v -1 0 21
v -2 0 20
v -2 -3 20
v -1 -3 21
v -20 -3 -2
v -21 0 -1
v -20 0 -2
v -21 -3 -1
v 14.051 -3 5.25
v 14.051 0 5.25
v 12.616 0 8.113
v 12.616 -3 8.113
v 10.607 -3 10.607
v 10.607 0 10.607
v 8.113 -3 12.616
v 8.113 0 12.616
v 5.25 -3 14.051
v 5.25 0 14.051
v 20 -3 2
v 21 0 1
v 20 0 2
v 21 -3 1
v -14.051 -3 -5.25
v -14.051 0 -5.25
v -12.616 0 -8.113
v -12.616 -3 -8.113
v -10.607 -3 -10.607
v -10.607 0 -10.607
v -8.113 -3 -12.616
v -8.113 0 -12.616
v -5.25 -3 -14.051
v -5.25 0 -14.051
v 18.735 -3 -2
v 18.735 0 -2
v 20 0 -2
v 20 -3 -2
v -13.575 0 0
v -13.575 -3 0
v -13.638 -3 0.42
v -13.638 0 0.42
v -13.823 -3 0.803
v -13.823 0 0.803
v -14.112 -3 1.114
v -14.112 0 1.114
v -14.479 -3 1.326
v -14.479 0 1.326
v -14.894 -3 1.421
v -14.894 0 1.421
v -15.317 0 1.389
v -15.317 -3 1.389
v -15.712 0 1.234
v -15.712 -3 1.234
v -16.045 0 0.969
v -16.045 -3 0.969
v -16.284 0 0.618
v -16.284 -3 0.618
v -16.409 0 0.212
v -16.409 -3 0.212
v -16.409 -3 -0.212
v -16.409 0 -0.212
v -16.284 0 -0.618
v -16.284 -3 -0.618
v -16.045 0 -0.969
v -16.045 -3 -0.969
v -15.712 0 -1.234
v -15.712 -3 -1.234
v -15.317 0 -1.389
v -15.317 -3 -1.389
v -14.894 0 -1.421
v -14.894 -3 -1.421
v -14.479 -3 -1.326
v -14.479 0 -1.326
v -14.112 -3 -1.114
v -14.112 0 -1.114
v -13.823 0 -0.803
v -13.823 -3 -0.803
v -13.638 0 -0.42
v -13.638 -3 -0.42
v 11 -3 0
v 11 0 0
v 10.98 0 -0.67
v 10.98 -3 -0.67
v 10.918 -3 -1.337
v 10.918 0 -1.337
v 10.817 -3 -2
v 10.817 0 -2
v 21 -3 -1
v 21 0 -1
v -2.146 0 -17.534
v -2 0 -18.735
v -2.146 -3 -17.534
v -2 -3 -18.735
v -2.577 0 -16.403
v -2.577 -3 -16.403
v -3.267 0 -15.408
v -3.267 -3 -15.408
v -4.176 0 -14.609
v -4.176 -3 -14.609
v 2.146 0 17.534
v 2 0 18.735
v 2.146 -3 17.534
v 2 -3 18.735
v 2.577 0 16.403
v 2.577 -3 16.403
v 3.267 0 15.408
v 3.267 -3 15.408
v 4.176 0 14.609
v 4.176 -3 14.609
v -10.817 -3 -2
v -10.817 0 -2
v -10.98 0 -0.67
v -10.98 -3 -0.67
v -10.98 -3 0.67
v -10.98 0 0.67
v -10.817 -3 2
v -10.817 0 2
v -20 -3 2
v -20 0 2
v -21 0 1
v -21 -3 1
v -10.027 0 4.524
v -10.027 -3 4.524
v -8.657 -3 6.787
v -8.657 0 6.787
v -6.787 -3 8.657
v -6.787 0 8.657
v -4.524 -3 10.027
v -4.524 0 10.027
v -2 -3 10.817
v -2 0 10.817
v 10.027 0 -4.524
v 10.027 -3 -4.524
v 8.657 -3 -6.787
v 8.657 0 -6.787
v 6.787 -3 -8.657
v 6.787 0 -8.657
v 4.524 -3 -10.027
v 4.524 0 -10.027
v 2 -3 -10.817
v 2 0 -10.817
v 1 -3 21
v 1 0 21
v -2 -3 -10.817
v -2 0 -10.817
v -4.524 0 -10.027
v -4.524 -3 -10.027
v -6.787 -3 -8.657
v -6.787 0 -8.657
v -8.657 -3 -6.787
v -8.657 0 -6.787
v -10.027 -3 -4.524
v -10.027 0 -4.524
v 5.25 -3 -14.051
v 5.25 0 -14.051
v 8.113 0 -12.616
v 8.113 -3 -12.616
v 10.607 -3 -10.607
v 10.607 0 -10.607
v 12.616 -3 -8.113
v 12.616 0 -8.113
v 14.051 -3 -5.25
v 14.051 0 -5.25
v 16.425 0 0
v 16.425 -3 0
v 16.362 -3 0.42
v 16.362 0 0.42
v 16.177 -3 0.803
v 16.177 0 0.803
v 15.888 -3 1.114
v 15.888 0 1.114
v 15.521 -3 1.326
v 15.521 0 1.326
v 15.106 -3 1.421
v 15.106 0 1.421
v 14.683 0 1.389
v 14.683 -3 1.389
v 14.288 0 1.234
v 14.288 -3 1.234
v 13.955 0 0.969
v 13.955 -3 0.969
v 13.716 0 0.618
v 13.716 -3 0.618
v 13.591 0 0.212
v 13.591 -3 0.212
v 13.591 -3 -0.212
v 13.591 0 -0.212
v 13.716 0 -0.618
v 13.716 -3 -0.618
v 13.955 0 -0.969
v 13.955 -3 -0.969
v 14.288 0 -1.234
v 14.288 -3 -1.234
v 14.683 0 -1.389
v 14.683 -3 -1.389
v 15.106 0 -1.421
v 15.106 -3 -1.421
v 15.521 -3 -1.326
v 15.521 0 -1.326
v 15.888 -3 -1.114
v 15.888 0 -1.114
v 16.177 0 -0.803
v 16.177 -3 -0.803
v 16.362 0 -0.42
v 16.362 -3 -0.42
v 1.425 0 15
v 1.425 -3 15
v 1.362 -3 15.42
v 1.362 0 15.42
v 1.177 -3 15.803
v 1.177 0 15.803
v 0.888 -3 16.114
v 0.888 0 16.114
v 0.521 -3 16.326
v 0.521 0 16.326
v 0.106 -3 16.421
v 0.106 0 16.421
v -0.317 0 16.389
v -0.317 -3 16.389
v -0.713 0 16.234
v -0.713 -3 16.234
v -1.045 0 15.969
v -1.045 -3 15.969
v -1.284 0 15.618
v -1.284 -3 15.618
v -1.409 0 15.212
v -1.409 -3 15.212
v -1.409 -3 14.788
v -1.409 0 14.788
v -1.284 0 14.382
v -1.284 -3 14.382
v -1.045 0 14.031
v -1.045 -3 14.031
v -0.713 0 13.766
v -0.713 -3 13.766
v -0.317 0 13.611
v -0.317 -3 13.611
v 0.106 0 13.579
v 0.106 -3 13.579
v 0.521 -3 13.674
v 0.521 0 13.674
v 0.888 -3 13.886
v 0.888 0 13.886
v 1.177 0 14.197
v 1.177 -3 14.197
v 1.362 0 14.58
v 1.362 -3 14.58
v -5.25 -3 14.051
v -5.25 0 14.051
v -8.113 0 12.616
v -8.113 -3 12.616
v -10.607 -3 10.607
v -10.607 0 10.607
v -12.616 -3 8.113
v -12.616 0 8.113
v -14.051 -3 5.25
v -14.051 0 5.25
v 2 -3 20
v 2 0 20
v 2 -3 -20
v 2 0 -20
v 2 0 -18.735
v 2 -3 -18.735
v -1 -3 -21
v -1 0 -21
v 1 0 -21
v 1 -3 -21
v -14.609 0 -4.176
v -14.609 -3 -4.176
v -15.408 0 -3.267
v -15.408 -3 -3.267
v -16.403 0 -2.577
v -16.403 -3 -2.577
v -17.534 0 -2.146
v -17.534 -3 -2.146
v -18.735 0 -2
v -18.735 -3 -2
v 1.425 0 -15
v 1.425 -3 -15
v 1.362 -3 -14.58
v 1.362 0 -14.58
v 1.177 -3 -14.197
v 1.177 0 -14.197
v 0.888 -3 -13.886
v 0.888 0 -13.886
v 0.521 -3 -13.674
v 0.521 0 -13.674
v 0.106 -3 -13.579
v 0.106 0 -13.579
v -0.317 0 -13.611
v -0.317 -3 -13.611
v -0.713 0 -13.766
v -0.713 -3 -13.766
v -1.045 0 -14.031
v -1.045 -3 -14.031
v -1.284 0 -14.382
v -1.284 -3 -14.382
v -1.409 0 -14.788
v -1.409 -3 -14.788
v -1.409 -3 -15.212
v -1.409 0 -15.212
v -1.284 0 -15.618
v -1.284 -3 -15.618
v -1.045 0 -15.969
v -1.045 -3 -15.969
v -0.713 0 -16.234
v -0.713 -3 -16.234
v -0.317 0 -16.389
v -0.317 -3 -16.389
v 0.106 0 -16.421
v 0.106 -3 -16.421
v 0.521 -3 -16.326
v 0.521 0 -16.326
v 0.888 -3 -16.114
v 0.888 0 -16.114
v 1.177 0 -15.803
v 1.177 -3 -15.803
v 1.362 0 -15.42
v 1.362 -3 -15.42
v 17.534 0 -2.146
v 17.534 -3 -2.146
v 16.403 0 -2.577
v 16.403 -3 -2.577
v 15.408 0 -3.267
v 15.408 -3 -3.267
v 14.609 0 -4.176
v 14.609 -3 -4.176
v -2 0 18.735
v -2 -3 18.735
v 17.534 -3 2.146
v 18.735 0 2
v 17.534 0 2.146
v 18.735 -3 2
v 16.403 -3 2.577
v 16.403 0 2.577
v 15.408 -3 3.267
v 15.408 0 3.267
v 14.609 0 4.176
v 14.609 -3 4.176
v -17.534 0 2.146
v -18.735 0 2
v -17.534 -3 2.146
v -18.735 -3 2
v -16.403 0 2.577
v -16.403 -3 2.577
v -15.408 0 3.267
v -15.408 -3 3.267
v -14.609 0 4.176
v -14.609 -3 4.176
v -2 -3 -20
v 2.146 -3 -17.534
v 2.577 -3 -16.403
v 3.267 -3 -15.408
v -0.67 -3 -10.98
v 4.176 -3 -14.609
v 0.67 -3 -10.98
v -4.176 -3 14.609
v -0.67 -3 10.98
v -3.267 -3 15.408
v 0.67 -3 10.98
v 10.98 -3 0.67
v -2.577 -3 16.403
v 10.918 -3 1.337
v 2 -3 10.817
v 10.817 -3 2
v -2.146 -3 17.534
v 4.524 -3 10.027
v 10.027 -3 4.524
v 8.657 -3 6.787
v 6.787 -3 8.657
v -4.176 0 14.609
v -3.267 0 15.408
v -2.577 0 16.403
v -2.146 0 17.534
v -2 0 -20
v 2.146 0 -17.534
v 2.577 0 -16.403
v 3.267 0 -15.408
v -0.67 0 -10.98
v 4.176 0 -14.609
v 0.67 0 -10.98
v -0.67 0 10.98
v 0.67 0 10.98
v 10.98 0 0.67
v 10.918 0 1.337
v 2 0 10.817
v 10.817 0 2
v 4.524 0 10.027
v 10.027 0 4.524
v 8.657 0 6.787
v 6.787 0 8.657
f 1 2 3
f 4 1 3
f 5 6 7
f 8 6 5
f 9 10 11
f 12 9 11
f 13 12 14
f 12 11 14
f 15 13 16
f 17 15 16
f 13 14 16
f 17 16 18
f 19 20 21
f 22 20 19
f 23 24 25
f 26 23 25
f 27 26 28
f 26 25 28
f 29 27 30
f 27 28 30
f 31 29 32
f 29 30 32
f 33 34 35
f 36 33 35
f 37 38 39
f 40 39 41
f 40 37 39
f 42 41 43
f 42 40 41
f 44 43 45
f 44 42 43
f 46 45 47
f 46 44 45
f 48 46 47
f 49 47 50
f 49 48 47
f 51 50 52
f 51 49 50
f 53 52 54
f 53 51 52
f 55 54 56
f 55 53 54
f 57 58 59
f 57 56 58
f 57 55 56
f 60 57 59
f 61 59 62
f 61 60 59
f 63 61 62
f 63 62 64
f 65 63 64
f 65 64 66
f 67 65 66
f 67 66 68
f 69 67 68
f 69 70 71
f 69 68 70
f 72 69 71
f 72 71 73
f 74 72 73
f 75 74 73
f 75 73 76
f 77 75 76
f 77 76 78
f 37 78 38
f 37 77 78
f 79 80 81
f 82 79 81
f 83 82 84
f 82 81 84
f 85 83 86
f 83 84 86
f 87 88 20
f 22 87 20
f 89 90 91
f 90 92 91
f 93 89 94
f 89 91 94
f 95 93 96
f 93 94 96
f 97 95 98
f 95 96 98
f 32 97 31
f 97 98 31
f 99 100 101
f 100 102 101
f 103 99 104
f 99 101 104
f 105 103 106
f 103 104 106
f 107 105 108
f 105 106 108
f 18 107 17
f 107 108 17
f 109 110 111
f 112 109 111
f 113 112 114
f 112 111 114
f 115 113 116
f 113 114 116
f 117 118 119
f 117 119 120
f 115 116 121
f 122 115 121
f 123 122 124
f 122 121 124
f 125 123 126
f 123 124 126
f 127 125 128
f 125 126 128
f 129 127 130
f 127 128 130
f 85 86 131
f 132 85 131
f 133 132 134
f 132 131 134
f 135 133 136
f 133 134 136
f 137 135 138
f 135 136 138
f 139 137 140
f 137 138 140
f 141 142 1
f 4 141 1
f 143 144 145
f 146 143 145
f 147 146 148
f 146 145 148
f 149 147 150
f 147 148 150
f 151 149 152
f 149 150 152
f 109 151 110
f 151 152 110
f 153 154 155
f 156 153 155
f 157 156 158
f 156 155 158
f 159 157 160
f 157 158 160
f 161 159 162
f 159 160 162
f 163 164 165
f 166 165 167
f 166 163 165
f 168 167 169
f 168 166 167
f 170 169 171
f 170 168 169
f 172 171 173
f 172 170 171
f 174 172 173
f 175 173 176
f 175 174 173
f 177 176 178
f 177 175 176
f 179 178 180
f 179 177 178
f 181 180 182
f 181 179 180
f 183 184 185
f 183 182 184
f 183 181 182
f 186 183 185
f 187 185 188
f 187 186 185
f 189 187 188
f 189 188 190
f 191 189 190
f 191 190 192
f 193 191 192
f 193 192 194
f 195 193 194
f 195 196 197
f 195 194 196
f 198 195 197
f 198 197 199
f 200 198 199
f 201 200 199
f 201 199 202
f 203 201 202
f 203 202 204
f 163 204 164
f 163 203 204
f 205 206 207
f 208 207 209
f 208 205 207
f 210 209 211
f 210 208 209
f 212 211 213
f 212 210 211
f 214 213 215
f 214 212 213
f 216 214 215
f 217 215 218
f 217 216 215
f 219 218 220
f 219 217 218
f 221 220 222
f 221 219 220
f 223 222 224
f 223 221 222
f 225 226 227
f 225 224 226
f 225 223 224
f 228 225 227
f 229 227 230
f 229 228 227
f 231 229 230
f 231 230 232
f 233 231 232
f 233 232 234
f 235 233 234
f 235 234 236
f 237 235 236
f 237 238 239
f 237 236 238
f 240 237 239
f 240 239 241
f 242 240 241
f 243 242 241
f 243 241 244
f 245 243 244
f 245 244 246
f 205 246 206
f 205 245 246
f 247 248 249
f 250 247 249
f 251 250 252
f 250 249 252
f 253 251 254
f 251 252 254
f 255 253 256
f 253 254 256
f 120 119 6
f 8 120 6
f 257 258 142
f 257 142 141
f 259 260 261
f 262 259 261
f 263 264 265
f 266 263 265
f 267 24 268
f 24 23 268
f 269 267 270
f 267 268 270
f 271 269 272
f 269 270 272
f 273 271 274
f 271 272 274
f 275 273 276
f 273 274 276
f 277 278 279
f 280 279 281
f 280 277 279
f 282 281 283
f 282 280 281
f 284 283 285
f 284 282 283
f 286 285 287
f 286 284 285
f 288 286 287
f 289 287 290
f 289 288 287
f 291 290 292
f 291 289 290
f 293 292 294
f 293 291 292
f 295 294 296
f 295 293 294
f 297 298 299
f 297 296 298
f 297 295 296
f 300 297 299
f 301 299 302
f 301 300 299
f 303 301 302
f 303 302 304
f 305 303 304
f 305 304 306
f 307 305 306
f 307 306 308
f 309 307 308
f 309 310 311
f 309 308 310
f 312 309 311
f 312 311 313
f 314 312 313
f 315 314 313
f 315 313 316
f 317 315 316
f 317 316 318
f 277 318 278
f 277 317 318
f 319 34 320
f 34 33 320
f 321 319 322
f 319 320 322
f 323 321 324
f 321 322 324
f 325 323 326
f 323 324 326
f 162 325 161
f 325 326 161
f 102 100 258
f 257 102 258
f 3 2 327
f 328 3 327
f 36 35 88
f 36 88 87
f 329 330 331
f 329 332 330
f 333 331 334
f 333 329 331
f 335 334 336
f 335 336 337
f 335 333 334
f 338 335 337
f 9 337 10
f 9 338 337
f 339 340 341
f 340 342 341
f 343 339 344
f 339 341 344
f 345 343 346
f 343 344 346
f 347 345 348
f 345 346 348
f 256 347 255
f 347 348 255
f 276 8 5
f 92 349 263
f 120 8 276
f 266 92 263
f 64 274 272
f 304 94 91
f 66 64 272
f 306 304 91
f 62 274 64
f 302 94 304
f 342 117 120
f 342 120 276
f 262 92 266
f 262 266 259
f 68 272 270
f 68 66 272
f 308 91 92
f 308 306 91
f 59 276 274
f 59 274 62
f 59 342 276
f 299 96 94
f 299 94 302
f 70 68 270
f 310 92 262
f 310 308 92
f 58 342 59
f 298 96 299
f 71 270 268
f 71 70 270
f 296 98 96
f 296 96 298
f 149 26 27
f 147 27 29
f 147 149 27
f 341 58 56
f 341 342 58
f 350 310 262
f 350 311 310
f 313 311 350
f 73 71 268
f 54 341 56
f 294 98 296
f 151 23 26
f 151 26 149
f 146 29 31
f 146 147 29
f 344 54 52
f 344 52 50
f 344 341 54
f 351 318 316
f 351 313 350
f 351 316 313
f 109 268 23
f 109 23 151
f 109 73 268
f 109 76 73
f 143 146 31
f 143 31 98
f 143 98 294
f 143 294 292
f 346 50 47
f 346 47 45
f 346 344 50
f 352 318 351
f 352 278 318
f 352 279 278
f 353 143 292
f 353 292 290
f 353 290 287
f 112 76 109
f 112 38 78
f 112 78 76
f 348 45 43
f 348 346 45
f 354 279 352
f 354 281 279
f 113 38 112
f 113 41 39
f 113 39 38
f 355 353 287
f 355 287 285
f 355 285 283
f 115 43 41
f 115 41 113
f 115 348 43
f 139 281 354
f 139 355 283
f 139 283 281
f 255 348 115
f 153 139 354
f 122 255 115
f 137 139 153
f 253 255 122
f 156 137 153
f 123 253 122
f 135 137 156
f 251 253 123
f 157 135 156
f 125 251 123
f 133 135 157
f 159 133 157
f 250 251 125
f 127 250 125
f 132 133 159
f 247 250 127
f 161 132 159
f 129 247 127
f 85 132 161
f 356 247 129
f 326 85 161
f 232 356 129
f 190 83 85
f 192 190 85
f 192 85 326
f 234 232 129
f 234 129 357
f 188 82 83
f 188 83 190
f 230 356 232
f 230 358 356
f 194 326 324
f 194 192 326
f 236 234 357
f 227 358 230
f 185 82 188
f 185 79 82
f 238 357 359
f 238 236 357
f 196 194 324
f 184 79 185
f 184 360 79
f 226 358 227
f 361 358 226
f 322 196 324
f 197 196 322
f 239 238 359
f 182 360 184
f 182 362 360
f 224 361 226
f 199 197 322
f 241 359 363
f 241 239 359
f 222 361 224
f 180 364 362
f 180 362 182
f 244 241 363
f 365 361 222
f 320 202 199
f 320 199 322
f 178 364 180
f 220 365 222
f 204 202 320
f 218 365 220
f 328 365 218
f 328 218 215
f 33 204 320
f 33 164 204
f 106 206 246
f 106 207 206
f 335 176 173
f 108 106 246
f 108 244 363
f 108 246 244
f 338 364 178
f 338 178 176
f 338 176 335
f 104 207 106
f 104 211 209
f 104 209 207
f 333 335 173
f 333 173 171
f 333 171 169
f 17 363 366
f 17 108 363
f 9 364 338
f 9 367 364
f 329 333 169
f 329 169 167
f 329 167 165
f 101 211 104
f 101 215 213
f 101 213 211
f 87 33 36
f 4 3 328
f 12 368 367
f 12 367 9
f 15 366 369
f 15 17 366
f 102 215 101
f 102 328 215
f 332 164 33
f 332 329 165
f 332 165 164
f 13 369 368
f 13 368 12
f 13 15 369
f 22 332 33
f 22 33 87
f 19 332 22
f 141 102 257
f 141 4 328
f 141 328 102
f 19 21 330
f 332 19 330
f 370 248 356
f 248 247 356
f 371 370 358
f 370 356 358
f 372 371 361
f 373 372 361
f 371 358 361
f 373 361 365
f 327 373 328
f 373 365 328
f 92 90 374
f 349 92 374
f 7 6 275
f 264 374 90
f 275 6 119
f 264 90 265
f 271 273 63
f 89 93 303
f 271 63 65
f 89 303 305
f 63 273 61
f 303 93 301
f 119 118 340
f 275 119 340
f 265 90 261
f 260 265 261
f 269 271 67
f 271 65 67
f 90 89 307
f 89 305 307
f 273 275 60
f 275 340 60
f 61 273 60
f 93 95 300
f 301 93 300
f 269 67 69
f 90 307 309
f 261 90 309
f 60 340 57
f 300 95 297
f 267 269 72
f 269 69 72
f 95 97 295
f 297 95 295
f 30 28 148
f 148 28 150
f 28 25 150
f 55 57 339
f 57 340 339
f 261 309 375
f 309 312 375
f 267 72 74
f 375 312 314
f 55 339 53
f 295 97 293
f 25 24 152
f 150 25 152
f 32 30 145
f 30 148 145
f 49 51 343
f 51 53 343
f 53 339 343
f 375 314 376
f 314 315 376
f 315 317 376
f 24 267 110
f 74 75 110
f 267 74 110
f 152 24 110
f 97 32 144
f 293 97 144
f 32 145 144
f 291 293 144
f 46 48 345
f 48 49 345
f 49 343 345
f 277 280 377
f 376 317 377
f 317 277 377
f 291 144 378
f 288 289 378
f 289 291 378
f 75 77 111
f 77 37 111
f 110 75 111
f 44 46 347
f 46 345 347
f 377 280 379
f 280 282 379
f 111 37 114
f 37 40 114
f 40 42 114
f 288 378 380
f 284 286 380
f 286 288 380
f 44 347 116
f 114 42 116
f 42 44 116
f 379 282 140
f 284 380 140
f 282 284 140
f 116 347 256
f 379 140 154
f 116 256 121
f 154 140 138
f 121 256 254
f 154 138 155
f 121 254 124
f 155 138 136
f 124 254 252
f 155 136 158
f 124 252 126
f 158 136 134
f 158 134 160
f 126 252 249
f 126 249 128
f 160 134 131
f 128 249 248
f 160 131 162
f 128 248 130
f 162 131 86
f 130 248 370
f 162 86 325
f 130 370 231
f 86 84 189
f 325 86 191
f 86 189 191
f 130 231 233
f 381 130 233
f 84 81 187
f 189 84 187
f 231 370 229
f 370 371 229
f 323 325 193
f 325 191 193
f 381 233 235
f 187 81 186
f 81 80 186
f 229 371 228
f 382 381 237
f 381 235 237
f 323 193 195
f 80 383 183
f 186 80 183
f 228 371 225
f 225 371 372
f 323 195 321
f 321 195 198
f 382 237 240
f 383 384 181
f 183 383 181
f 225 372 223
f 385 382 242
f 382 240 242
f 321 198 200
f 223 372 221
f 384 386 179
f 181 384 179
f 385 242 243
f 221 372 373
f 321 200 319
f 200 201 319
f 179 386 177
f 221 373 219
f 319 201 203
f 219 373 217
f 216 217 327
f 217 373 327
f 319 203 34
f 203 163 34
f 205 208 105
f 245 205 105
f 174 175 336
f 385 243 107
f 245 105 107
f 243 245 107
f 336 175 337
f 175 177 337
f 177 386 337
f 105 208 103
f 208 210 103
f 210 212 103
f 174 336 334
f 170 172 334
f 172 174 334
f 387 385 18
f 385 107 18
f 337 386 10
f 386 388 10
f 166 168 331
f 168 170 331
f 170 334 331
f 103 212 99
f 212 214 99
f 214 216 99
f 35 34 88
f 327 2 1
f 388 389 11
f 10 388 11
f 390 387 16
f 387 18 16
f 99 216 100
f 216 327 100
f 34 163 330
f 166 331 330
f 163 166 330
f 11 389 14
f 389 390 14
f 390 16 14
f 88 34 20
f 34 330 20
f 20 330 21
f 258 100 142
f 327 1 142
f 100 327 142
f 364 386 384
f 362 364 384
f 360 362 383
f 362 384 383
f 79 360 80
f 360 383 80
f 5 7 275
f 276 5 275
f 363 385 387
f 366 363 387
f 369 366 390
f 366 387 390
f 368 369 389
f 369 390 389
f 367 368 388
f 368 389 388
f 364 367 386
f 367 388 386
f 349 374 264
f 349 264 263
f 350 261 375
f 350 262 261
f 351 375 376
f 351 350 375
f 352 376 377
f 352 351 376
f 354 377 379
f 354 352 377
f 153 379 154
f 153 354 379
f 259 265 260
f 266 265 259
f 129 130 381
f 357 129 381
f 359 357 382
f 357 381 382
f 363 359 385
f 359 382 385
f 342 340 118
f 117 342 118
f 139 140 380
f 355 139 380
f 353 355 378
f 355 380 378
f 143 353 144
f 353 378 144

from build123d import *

# Parameters (mm, degrees)
F1_DEPTH = 3
F2_SIZE  = 1
F3_SIZE  = 1
F4_SIZE  = 1
F5_SIZE  = 1
F6_SIZE  = 1
F7_R     = 1.425
F8_DEPTH = 3.001
F9_R     = 5
F10_R    = 5
F11_R    = 5
F12_R    = 5
F13_R    = 5
F14_R    = 5
F15_R    = 5
F16_R    = 5


with BuildPart() as f1:
    # F0 (on Front) → F1 (new body)
    with BuildSketch(Plane.XZ):
        with BuildLine():
            ThreePointArc((10.8166538264, 2), (10.9540675571, 1.004193186), (11, 0))
            ThreePointArc((11, 0), (10.9540675571, -1.004193186), (10.8166538264, -2))
            Line((10.8166538264, -2), (14.8660687473, -2))
            ThreePointArc((14.8660687473, -2), (14.9664797332, -1.0022396895), (15, 0))
            ThreePointArc((15, 0), (14.9664797332, 1.0022396895), (14.8660687473, 2))
            Line((14.8660687473, 2), (10.8166538264, 2))
        make_face()
        with BuildLine():
            ThreePointArc((2, 10.8166538264), (7.7781745931, 7.7781745931), (10.8166538264, 2))
            Line((10.8166538264, 2), (14.8660687473, 2))
            ThreePointArc((14.8660687473, 2), (10.6066017178, 10.6066017178), (2, 14.8660687473))
            Line((2, 14.8660687473), (2, 10.8166538264))
        make_face()
        with BuildLine():
            Line((14.8660687473, -2), (10.8166538264, -2))
            ThreePointArc((10.8166538264, -2), (7.7781745931, -7.7781745931), (2, -10.8166538264))
            Line((2, -10.8166538264), (2, -14.8660687473))
            ThreePointArc((2, -14.8660687473), (10.6066017178, -10.6066017178), (14.8660687473, -2))
        make_face()
        with BuildLine():
            ThreePointArc((-2, 10.8166538264), (0, 11), (2, 10.8166538264))
            Line((2, 10.8166538264), (2, 14.8660687473))
            ThreePointArc((2, 14.8660687473), (0, 15), (-2, 14.8660687473))
            Line((-2, 14.8660687473), (-2, 10.8166538264))
        make_face()
        with BuildLine():
            Line((21, 2), (14.8660687473, 2))
            ThreePointArc((14.8660687473, 2), (14.9664797332, 1.0022396895), (15, 0))
            ThreePointArc((15, 0), (14.9664797332, -1.0022396895), (14.8660687473, -2))
            Line((14.8660687473, -2), (21, -2))
            Line((21, -2), (21, 2))
        make_face()
        with BuildLine():
            Line((2, -14.8660687473), (2, -10.8166538264))
            ThreePointArc((2, -10.8166538264), (0, -11), (-2, -10.8166538264))
            Line((-2, -10.8166538264), (-2, -14.8660687473))
            ThreePointArc((-2, -14.8660687473), (0, -15), (2, -14.8660687473))
        make_face()
        with BuildLine():
            ThreePointArc((-10.8166538264, 2), (-7.7781745931, 7.7781745931), (-2, 10.8166538264))
            Line((-2, 10.8166538264), (-2, 14.8660687473))
            ThreePointArc((-2, 14.8660687473), (-10.6066017178, 10.6066017178), (-14.8660687473, 2))
            Line((-14.8660687473, 2), (-10.8166538264, 2))
        make_face()
        with BuildLine():
            ThreePointArc((-2, 14.8660687473), (0, 15), (2, 14.8660687473))
            Line((2, 14.8660687473), (2, 21))
            Line((2, 21), (-2, 21))
            Line((-2, 21), (-2, 14.8660687473))
        make_face()
        with BuildLine():
            Line((-2, -14.8660687473), (-2, -10.8166538264))
            ThreePointArc((-2, -10.8166538264), (-7.7781745931, -7.7781745931), (-10.8166538264, -2))
            Line((-10.8166538264, -2), (-14.8660687473, -2))
            ThreePointArc((-14.8660687473, -2), (-10.6066017178, -10.6066017178), (-2, -14.8660687473))
        make_face()
        with BuildLine():
            Line((2, -21), (2, -14.8660687473))
            ThreePointArc((2, -14.8660687473), (0, -15), (-2, -14.8660687473))
            Line((-2, -14.8660687473), (-2, -21))
            Line((-2, -21), (2, -21))
        make_face()
        with BuildLine():
            ThreePointArc((-10.8166538264, -2), (-11, 0), (-10.8166538264, 2))
            Line((-10.8166538264, 2), (-14.8660687473, 2))
            ThreePointArc((-14.8660687473, 2), (-15, 0), (-14.8660687473, -2))
            Line((-14.8660687473, -2), (-10.8166538264, -2))
        make_face()
        with BuildLine():
            ThreePointArc((-14.8660687473, -2), (-15, 0), (-14.8660687473, 2))
            Line((-14.8660687473, 2), (-21, 2))
            Line((-21, 2), (-21, -2))
            Line((-21, -2), (-14.8660687473, -2))
        make_face()
    extrude(amount=F1_DEPTH)

    # F2
    f2_edges = [f1.edges().sort_by_distance(p)[0] for p in [
        (-2, -1.5, 21),
    ]]
    chamfer(f2_edges, length=F2_SIZE)

    # F3
    f3_edges = [f1.edges().sort_by_distance(p)[0] for p in [
        (2, -1.5, 21),
    ]]
    chamfer(f3_edges, length=F3_SIZE)

    # F4
    f4_edges = [f1.edges().sort_by_distance(p)[0] for p in [
        (21, -1.5, 2),
        (21, -1.5, -2),
    ]]
    chamfer(f4_edges, length=F4_SIZE)

    # F5
    f5_edges = [f1.edges().sort_by_distance(p)[0] for p in [
        (2, -1.5, -21),
        (-2, -1.5, -21),
    ]]
    chamfer(f5_edges, length=F5_SIZE)

    # F6
    f6_edges = [f1.edges().sort_by_distance(p)[0] for p in [
        (-21, -1.5, 2),
        (-21, -1.5, -2),
    ]]
    chamfer(f6_edges, length=F6_SIZE)

    # F7 (on Front) → F8 (cut, through all)
    with BuildSketch(Plane.XZ):
        with Locations((0, 15)):
            Circle(F7_R)
        with Locations((15, 0)):
            Circle(F7_R)
        with Locations((-15, 0)):
            Circle(F7_R)
        with Locations((0, -15)):
            Circle(F7_R)
    extrude(amount=F8_DEPTH, mode=Mode.SUBTRACT)

    # F9
    f9_edges = [f1.edges().sort_by_distance(p)[0] for p in [
        (-2, -1.5, 14.866069),
    ]]
    fillet(f9_edges, radius=F9_R)

    # F10
    f10_edges = [f1.edges().sort_by_distance(p)[0] for p in [
        (2, -1.5, 14.866069),
    ]]
    fillet(f10_edges, radius=F10_R)

    # F11
    f11_edges = [f1.edges().sort_by_distance(p)[0] for p in [
        (14.866069, -1.5, -2),
    ]]
    fillet(f11_edges, radius=F11_R)

    # F12
    f12_edges = [f1.edges().sort_by_distance(p)[0] for p in [
        (-2, -1.5, -14.866069),
    ]]
    fillet(f12_edges, radius=F12_R)

    # F13
    f13_edges = [f1.edges().sort_by_distance(p)[0] for p in [
        (2, -1.5, -14.866069),
    ]]
    fillet(f13_edges, radius=F13_R)

    # F14
    f14_edges = [f1.edges().sort_by_distance(p)[0] for p in [
        (14.866069, -1.5, 2),
    ]]
    fillet(f14_edges, radius=F14_R)

    # F15
    f15_edges = [f1.edges().sort_by_distance(p)[0] for p in [
        (-14.866069, -1.5, -2),
    ]]
    fillet(f15_edges, radius=F15_R)

    # F16
    f16_edges = [f1.edges().sort_by_distance(p)[0] for p in [
        (-14.866069, -1.5, 2),
    ]]
    fillet(f16_edges, radius=F16_R)


solid = f1.part
